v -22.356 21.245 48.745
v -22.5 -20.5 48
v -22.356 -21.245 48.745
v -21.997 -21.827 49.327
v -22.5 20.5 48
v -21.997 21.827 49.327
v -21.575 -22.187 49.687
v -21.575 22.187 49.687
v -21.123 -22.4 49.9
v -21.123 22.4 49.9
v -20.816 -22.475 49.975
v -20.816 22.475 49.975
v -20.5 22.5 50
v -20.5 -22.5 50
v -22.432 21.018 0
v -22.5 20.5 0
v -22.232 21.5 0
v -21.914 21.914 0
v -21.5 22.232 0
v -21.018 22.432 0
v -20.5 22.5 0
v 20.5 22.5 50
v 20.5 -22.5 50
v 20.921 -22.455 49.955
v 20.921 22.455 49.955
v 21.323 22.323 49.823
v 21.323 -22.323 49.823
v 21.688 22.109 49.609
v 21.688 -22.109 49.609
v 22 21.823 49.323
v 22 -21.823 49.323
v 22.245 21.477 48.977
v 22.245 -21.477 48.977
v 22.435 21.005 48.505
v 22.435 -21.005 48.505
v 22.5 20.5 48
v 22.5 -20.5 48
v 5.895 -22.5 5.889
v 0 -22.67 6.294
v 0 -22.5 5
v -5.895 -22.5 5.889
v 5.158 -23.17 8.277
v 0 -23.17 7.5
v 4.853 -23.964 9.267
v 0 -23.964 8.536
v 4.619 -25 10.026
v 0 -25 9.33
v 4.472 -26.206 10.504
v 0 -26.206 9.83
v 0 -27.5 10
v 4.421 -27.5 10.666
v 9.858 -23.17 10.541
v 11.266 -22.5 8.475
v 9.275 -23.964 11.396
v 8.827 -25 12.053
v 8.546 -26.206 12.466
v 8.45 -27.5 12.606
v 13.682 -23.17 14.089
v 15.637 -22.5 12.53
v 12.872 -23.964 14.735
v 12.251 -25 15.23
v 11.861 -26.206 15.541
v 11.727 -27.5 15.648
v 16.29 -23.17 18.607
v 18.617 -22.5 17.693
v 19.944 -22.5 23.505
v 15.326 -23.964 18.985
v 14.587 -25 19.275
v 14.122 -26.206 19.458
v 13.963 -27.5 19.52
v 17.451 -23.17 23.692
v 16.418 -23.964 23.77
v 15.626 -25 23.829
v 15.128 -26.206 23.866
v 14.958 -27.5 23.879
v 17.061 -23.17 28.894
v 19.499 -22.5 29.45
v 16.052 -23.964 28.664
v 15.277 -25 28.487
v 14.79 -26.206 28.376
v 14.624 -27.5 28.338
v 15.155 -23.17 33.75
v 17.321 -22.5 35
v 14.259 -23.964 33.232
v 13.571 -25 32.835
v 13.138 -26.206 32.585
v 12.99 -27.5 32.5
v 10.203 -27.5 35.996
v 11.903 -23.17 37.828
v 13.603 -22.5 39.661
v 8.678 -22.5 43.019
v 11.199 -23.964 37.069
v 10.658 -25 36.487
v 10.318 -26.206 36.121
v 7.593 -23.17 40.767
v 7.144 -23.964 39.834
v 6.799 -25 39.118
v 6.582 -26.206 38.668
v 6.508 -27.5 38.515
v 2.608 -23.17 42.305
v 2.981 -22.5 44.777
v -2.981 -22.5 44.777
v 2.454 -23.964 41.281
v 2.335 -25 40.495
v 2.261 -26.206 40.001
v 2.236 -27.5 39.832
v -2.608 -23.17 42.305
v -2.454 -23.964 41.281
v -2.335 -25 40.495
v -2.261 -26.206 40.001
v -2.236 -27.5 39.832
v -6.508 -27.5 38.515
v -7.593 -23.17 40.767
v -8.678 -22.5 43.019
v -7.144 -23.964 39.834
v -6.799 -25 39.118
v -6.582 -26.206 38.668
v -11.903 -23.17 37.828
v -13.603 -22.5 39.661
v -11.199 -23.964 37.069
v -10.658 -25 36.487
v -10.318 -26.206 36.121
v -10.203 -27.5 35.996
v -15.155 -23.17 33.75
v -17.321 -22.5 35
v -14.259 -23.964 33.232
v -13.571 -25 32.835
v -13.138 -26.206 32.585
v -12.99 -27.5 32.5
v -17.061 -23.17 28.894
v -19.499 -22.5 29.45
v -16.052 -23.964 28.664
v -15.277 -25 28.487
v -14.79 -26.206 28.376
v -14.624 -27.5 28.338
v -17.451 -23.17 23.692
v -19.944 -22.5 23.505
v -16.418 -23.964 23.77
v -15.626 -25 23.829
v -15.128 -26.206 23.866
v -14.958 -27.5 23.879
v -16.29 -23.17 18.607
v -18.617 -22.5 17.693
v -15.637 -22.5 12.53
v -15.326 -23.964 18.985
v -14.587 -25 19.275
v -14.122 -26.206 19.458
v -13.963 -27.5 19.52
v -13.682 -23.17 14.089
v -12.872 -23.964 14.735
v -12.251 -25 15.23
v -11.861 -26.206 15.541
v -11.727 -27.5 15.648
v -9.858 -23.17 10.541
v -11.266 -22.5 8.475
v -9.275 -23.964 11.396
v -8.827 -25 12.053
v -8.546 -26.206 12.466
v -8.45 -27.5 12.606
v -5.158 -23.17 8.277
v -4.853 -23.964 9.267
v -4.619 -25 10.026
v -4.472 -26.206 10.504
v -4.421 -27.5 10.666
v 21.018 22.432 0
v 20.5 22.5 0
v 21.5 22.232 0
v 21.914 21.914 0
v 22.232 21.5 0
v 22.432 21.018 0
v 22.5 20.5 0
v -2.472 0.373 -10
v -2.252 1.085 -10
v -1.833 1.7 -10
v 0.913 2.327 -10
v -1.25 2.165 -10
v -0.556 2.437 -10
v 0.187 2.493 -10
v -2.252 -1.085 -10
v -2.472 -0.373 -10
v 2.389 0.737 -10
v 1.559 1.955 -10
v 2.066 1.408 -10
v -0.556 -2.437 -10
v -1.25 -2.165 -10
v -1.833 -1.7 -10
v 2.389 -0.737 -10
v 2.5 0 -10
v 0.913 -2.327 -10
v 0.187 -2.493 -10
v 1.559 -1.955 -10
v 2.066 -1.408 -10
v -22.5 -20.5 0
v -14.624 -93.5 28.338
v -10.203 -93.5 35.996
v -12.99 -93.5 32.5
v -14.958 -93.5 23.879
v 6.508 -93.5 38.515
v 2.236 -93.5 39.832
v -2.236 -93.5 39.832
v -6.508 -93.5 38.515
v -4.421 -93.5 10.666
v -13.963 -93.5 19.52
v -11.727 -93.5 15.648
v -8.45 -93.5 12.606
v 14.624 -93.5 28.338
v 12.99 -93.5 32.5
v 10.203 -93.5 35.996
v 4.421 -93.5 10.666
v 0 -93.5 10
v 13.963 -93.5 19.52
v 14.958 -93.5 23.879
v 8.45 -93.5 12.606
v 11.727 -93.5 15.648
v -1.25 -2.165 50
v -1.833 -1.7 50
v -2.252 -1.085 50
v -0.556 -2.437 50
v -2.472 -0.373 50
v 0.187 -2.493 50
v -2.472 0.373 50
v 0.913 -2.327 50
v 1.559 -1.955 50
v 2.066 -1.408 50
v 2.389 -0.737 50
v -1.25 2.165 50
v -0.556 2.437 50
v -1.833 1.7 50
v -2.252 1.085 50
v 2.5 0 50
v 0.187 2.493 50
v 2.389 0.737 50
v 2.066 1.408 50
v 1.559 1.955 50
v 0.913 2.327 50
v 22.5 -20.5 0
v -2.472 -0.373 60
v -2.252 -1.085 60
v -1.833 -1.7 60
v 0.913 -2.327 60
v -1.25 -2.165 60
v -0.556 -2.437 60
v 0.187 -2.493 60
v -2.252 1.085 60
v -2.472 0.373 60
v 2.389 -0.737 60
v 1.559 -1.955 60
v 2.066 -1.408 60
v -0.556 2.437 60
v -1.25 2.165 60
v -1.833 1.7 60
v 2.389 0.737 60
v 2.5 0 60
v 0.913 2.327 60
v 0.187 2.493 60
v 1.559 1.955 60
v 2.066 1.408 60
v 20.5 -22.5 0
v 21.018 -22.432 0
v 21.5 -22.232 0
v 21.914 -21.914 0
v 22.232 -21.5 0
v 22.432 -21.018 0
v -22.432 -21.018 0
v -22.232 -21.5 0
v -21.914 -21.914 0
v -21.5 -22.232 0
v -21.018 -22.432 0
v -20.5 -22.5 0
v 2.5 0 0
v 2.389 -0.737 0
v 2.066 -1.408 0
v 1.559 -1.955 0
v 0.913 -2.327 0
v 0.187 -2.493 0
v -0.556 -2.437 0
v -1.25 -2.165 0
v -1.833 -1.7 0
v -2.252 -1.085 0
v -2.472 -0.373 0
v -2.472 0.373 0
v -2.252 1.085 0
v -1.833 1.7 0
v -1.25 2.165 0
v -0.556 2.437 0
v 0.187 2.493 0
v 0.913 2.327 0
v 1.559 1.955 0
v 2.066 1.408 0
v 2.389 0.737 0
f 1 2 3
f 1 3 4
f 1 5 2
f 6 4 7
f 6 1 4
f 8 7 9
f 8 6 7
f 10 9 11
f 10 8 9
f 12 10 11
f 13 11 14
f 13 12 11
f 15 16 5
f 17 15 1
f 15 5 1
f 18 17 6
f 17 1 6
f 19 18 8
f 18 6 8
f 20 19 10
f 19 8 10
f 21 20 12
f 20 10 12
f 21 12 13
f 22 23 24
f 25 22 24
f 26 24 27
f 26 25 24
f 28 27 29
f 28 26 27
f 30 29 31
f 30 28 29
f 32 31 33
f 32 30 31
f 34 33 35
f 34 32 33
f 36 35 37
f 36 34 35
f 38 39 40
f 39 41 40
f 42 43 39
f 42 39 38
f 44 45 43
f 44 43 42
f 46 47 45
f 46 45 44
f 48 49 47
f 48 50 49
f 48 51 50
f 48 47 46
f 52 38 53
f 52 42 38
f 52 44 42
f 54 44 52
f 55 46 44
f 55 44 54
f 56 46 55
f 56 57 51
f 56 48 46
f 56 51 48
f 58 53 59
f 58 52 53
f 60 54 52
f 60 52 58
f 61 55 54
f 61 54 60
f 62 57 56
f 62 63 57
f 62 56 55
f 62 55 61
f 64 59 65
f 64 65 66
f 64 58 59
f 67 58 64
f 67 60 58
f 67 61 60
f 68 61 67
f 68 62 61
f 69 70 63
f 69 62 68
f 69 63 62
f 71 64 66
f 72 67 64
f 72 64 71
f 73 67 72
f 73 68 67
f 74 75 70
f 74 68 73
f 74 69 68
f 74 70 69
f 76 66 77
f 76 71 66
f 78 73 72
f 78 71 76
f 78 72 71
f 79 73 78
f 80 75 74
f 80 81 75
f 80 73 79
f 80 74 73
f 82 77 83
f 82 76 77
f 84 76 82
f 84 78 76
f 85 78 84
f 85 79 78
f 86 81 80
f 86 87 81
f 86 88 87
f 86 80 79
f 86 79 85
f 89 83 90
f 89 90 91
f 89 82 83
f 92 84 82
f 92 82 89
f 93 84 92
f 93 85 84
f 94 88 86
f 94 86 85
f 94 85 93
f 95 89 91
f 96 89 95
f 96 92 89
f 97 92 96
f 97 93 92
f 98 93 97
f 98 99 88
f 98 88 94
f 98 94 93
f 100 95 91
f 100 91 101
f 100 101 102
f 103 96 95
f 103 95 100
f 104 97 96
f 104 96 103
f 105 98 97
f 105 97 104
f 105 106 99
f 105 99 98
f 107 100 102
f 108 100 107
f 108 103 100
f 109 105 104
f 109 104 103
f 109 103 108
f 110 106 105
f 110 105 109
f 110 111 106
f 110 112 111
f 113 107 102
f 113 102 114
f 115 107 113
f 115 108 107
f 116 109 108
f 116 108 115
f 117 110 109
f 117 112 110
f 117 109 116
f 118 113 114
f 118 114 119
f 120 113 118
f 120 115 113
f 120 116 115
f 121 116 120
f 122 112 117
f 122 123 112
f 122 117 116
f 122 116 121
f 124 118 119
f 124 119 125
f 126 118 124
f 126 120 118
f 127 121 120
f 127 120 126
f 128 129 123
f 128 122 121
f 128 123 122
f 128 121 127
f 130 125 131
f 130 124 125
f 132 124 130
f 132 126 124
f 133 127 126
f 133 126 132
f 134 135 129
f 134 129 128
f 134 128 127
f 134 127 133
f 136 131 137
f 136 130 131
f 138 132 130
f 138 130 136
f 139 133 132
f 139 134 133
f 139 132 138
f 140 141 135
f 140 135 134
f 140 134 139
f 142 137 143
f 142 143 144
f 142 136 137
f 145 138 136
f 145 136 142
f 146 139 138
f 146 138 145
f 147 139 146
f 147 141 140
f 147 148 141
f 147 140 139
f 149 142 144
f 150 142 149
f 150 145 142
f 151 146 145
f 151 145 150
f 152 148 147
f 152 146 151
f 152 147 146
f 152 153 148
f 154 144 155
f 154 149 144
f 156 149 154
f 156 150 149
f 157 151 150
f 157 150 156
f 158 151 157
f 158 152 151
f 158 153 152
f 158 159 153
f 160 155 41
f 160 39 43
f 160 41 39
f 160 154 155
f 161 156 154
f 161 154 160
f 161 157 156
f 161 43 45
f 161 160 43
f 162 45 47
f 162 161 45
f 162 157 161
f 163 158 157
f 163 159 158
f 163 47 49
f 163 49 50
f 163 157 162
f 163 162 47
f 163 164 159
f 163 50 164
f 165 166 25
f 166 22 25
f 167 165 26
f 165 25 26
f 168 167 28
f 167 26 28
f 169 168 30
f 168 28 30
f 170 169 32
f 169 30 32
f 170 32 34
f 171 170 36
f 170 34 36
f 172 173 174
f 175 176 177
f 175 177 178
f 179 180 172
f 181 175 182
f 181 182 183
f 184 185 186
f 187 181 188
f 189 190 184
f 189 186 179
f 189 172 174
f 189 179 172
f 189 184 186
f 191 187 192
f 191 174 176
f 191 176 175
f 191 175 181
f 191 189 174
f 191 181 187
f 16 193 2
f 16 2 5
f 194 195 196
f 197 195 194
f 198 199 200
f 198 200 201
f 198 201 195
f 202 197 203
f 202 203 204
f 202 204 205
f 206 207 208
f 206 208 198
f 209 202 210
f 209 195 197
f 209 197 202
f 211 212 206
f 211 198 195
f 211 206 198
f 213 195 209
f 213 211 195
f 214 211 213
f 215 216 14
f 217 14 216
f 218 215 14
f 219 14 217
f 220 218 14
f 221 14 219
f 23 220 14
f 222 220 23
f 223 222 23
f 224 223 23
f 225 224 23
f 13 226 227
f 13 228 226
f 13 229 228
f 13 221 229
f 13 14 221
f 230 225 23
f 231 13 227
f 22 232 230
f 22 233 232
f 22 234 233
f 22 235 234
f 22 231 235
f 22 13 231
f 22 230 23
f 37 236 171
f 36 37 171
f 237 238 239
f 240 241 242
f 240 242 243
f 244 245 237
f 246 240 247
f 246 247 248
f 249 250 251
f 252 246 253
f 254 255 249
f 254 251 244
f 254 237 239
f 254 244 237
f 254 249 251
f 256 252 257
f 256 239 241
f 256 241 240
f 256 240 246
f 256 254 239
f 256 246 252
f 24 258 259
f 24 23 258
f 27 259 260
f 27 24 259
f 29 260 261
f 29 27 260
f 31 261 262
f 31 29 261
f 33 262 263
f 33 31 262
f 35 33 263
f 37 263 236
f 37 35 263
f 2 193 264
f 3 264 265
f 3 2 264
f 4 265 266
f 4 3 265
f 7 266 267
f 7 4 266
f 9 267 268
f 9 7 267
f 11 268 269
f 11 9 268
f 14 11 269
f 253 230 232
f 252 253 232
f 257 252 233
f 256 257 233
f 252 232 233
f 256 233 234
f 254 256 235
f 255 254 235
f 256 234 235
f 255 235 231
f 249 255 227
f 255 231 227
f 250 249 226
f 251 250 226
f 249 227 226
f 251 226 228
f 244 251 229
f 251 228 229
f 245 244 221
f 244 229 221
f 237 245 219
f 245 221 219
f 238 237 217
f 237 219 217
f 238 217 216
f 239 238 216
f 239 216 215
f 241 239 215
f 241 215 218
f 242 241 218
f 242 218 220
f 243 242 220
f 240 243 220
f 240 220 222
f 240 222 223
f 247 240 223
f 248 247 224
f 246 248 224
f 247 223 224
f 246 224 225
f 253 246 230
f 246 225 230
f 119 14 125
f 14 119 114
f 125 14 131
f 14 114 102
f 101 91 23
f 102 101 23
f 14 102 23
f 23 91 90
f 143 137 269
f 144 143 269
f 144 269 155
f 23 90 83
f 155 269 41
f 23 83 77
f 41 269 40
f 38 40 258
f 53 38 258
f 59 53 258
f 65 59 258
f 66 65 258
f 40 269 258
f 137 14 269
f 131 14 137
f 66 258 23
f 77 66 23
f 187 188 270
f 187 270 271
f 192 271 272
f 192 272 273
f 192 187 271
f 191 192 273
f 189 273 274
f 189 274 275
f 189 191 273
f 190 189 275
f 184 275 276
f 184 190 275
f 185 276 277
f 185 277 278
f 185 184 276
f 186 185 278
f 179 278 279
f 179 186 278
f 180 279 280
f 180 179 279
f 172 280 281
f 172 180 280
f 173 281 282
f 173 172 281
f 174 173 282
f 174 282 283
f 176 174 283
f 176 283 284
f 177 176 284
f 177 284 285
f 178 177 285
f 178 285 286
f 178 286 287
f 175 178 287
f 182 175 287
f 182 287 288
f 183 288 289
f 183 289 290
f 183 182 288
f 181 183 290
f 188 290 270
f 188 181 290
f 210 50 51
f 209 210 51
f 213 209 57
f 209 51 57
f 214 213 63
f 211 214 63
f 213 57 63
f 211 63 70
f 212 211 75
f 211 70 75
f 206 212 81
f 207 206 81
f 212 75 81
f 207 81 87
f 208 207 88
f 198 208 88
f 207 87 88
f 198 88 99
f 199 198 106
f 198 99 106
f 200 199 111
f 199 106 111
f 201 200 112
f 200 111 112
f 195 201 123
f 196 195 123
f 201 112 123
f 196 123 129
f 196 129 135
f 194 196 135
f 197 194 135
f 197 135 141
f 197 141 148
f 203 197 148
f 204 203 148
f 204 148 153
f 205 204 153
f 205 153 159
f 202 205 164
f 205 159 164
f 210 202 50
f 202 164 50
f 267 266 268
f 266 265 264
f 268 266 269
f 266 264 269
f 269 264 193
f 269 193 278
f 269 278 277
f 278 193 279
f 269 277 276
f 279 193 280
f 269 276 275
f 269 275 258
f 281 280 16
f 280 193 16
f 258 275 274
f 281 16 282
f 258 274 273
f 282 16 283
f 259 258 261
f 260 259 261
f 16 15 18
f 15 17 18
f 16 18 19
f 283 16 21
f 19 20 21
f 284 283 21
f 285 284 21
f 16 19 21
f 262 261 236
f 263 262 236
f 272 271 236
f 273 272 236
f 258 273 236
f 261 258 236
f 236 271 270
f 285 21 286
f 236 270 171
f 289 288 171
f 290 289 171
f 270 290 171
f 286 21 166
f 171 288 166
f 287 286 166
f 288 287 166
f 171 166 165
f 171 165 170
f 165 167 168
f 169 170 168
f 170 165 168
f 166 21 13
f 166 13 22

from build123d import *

# Parameters (mm, degrees)
SKETCH1_W           = 45
SKETCH1_H           = 45
BOSS_EXTRUDE1_DEPTH = 50
SKETCH4_R           = 15
BOSS_EXTRUDE2_DEPTH = 71
FILLET1_R           = 2
FILLET2_R           = 5
SKETCH5_R           = 2.5
BOSS_EXTRUDE3_DEPTH = 10
BOSS_EXTRUDE4_START = 10
SKETCH6_R           = 2.5
BOSS_EXTRUDE4_DEPTH = 10


with BuildPart() as part:
    # Sketch1 → Boss-Extrude1 (new body)
    with BuildSketch(Plane.XY):
        Rectangle(SKETCH1_W, SKETCH1_H)
    extrude(amount=BOSS_EXTRUDE1_DEPTH)

    # Sketch4 → Boss-Extrude2 (add)
    with BuildSketch(Plane.XZ.offset(22.5)):
        with Locations(Location((0, 25, 0), (0, 0, 270))):
            Circle(SKETCH4_R)
    extrude(amount=BOSS_EXTRUDE2_DEPTH)

    # Fillet1
    fillet1_edges = [part.edges().sort_by_distance(p)[0] for p in [
        (-22.5, 0, 50),
        (22.5, 0, 50),
        (22.5, -22.5, 25),
        (-22.5, -22.5, 25),
        (-22.5, 22.5, 25),
        (22.5, 22.5, 25),
    ]]
    fillet(fillet1_edges, radius=FILLET1_R)

    # Fillet2
    fillet2_edges = [part.edges().sort_by_distance(p)[0] for p in [
        (0, -22.5, 40),
    ]]
    fillet(fillet2_edges, radius=FILLET2_R)

    # Sketch5 → Boss-Extrude3 (add)
    with BuildSketch(Plane.XY.offset(50)):
        Circle(SKETCH5_R)
    extrude(amount=BOSS_EXTRUDE3_DEPTH)

    # Sketch6 → Boss-Extrude4 (add)
    with BuildSketch(Plane(origin=(0, 0, 0), x_dir=(-1, 0, 0), z_dir=(0, 0, -1)).offset(BOSS_EXTRUDE4_START)):
        with Locations(Location((0, 0, 0), (0, 0, 180))):
            Circle(SKETCH6_R)
    extrude(amount=-BOSS_EXTRUDE4_DEPTH)


solid = part.part
